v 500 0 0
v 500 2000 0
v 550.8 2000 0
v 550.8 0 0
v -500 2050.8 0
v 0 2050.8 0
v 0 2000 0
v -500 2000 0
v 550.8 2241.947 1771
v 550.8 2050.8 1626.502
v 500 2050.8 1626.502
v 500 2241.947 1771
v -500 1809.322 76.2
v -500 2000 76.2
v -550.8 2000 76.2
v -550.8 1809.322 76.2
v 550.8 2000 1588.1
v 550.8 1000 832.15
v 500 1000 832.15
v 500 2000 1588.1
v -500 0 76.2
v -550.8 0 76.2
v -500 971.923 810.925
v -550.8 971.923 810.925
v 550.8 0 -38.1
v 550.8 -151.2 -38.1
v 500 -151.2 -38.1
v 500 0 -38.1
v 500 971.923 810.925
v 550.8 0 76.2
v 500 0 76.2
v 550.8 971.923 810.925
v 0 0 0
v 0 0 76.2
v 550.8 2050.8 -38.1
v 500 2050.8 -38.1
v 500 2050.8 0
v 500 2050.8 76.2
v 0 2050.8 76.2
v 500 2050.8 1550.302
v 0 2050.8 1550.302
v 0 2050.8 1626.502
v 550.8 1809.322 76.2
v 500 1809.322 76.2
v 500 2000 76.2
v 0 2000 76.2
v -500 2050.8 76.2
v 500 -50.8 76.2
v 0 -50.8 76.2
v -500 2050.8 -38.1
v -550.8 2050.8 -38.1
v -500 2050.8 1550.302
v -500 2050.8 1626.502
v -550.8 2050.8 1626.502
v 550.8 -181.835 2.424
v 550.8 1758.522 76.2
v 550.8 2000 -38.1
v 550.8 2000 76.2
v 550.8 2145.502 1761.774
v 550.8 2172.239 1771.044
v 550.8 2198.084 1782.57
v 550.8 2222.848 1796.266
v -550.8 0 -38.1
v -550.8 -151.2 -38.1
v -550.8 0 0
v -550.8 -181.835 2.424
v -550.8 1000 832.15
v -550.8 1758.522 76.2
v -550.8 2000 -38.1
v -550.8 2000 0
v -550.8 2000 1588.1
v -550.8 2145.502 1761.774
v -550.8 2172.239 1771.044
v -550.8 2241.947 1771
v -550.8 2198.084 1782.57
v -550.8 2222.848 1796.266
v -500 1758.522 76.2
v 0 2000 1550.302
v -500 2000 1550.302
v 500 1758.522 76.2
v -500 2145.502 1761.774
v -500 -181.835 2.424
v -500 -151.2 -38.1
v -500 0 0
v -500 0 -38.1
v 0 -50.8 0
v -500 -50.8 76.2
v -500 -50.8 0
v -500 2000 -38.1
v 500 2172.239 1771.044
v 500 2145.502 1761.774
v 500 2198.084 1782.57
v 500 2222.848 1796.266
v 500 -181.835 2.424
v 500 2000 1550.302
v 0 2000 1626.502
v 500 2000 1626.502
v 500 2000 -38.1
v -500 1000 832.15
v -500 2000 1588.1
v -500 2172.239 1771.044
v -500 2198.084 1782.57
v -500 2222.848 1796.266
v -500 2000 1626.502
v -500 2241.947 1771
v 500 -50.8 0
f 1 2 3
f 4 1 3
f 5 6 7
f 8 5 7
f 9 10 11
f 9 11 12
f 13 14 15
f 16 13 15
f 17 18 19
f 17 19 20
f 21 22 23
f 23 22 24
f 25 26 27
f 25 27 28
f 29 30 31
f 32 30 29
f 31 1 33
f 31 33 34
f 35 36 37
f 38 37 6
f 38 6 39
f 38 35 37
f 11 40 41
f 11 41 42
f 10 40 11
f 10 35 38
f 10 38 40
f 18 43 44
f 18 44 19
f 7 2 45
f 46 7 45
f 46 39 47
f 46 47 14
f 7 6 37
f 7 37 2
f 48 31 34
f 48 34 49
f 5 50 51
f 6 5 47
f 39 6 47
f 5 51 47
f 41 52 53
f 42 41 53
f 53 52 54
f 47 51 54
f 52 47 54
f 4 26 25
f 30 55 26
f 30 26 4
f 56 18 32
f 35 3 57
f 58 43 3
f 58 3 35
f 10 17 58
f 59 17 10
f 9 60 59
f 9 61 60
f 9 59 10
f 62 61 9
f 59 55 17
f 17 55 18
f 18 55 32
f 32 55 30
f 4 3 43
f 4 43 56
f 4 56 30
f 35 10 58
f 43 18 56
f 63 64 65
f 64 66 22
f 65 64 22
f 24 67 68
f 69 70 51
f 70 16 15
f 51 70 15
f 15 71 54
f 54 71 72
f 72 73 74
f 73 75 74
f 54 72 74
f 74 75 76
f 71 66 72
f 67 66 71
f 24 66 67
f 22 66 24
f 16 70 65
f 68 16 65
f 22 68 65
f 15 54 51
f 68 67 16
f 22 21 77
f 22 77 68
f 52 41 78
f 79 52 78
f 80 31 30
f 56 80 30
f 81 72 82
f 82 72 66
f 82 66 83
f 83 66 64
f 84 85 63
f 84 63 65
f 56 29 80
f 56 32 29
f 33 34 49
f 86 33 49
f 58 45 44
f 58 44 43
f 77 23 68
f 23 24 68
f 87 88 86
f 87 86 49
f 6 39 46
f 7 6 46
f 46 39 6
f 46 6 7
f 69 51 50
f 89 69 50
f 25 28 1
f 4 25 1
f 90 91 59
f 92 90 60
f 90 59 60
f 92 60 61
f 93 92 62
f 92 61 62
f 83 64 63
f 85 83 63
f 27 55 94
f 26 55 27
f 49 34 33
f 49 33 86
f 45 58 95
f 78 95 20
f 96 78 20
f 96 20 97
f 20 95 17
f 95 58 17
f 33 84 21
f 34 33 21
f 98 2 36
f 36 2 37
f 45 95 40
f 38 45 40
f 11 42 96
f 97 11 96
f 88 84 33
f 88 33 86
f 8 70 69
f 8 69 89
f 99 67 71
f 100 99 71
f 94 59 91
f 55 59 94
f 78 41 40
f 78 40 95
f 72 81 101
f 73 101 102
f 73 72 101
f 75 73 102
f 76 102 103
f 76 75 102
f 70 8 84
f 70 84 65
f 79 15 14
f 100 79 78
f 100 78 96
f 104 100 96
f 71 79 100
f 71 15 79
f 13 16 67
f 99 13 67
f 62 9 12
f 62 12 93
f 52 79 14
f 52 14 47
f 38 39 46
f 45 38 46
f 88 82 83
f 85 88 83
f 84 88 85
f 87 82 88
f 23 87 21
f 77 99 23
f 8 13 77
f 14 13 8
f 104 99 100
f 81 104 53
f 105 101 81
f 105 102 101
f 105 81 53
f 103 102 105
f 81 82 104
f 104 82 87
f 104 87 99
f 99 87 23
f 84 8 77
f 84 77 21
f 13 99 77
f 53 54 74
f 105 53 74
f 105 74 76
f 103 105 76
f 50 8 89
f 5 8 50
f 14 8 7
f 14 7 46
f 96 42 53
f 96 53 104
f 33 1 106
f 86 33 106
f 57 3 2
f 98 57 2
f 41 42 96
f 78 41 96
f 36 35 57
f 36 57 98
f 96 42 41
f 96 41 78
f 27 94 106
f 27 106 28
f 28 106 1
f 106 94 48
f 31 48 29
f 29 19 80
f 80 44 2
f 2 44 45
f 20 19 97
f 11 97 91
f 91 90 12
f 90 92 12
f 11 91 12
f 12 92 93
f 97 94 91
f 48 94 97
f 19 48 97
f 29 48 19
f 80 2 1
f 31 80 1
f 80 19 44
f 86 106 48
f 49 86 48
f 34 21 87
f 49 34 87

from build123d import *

# Parameters (mm, degrees)
F0_W      = 50.8
F0_H      = 76.2
F1_DEPTH  = 2000
F3_DEPTH  = 50.8
F5_DEPTH  = 50.8
F6_W      = 50.8
F6_H      = 76.2
F7_DEPTH  = 500
F9_DEPTH  = 50.8
F12_DEPTH = 1050.801
F14_DEPTH = 50.8


with BuildPart() as f1:
    # F0 (on Front) → F1 (new body)
    with BuildSketch(Plane.XZ):
        with Locations((525.4, 38.1)):
            Rectangle(F0_W, F0_H)
    extrude(amount=-F1_DEPTH)

    # F2 (on face) → F3 (join)
    with BuildSketch(Plane(origin=(0, 2000, 0), x_dir=(-1, 0, 0), z_dir=(0, 1, 0))):
        Polygon((-550.8, 1588.1), (-550.8, 38.1), (-550.8, -38.1), (-500, -38.1), (-500, 38.1), (-500, 1588.1), align=None)
    extrude(amount=F3_DEPTH)

    # F4 (on face) → F5 (join)
    with BuildSketch(Plane.YZ.offset(550.8)):
        Polygon((2050.8, 1626.50226), (2000, 1588.1), (2050.8, 1588.1), align=None)
        Polygon((-151.200476, -38.1), (0, 76.2), (2000, 1588.1), (2050.8, 1626.50226), (2241.947392, 1771.000131), (2211.313296, 1811.524101), (-181.834572, 2.423971), align=None)
        Polygon((0, 0), (0, 76.2), (-151.200476, -38.1), (0, -38.1), align=None)
    extrude(amount=-F5_DEPTH)

    # F6 (on face) → F7 (join)
    with BuildSketch(Plane(origin=(500, 0, 0), x_dir=(0, -1, 0), z_dir=(-1, 0, 0))):
        with Locations((25.4, 38.1)):
            Rectangle(F6_W, F6_H)
        with Locations((-2025.4, 38.1)):
            Rectangle(F6_W, F6_H)
        with Locations((-2025.4, 1588.40226)):
            Rectangle(F6_W, F6_H)
    extrude(amount=F7_DEPTH)

    # F11 (on face) → F12 (cut, through all)
    with BuildSketch(Plane.YZ.offset(550.8)):
        with BuildLine():
            ThreePointArc((2145.501875, 1761.773958), (2185.28513, 1776.530063), (2222.847627, 1796.266041))
            Line((2222.847627, 1796.266041), (2211.313296, 1811.524101))
            Line((2211.313296, 1811.524101), (2145.501875, 1761.773958))
        make_face()
    extrude(amount=-F12_DEPTH, mode=Mode.SUBTRACT)

    # F13 (on face) → F14 (join)
    with BuildSketch(Plane.YZ.offset(550.8)):
        Polygon((1758.522357, 76.2), (1809.322357, 76.2), (1000, 832.15), (971.92319, 810.925336), align=None)
    extrude(amount=-F14_DEPTH)


with BuildPart() as f9:
    # F8 (on face) → F9 (new body)
    with BuildSketch(Plane(origin=(0, 2050.8, 0), x_dir=(-1, 0, 0), z_dir=(0, 1, 0))):
        Polygon((-500, 1270.90226), (-500, 1220.10226), (-39.943245, 927.55113), (0, 952.95113), align=None)
        Polygon((-500, 635), (-500, 584.2), (0, 902.15113), (-39.943245, 927.55113), align=None)
        Polygon((39.943245, 927.55113), (0, 902.15113), (500, 584.2), (500, 635), align=None)
        Polygon((0, 952.95113), (39.943245, 927.55113), (500, 1220.10226), (500, 1270.90226), align=None)
    extrude(amount=-F9_DEPTH)


with BuildPart() as f15_1:
    # F15: instance of F1
    add(f1.part.mirror(Plane(origin=(0, 2025.4, 38.1), x_dir=(0, -1, 0), z_dir=(-1, 0, 0))))


with BuildPart() as f15_2:
    # F15: instance of F9
    add(f9.part.mirror(Plane(origin=(0, 2025.4, 38.1), x_dir=(0, -1, 0), z_dir=(-1, 0, 0))))


solid = Compound([f1.part, f15_1.part])
